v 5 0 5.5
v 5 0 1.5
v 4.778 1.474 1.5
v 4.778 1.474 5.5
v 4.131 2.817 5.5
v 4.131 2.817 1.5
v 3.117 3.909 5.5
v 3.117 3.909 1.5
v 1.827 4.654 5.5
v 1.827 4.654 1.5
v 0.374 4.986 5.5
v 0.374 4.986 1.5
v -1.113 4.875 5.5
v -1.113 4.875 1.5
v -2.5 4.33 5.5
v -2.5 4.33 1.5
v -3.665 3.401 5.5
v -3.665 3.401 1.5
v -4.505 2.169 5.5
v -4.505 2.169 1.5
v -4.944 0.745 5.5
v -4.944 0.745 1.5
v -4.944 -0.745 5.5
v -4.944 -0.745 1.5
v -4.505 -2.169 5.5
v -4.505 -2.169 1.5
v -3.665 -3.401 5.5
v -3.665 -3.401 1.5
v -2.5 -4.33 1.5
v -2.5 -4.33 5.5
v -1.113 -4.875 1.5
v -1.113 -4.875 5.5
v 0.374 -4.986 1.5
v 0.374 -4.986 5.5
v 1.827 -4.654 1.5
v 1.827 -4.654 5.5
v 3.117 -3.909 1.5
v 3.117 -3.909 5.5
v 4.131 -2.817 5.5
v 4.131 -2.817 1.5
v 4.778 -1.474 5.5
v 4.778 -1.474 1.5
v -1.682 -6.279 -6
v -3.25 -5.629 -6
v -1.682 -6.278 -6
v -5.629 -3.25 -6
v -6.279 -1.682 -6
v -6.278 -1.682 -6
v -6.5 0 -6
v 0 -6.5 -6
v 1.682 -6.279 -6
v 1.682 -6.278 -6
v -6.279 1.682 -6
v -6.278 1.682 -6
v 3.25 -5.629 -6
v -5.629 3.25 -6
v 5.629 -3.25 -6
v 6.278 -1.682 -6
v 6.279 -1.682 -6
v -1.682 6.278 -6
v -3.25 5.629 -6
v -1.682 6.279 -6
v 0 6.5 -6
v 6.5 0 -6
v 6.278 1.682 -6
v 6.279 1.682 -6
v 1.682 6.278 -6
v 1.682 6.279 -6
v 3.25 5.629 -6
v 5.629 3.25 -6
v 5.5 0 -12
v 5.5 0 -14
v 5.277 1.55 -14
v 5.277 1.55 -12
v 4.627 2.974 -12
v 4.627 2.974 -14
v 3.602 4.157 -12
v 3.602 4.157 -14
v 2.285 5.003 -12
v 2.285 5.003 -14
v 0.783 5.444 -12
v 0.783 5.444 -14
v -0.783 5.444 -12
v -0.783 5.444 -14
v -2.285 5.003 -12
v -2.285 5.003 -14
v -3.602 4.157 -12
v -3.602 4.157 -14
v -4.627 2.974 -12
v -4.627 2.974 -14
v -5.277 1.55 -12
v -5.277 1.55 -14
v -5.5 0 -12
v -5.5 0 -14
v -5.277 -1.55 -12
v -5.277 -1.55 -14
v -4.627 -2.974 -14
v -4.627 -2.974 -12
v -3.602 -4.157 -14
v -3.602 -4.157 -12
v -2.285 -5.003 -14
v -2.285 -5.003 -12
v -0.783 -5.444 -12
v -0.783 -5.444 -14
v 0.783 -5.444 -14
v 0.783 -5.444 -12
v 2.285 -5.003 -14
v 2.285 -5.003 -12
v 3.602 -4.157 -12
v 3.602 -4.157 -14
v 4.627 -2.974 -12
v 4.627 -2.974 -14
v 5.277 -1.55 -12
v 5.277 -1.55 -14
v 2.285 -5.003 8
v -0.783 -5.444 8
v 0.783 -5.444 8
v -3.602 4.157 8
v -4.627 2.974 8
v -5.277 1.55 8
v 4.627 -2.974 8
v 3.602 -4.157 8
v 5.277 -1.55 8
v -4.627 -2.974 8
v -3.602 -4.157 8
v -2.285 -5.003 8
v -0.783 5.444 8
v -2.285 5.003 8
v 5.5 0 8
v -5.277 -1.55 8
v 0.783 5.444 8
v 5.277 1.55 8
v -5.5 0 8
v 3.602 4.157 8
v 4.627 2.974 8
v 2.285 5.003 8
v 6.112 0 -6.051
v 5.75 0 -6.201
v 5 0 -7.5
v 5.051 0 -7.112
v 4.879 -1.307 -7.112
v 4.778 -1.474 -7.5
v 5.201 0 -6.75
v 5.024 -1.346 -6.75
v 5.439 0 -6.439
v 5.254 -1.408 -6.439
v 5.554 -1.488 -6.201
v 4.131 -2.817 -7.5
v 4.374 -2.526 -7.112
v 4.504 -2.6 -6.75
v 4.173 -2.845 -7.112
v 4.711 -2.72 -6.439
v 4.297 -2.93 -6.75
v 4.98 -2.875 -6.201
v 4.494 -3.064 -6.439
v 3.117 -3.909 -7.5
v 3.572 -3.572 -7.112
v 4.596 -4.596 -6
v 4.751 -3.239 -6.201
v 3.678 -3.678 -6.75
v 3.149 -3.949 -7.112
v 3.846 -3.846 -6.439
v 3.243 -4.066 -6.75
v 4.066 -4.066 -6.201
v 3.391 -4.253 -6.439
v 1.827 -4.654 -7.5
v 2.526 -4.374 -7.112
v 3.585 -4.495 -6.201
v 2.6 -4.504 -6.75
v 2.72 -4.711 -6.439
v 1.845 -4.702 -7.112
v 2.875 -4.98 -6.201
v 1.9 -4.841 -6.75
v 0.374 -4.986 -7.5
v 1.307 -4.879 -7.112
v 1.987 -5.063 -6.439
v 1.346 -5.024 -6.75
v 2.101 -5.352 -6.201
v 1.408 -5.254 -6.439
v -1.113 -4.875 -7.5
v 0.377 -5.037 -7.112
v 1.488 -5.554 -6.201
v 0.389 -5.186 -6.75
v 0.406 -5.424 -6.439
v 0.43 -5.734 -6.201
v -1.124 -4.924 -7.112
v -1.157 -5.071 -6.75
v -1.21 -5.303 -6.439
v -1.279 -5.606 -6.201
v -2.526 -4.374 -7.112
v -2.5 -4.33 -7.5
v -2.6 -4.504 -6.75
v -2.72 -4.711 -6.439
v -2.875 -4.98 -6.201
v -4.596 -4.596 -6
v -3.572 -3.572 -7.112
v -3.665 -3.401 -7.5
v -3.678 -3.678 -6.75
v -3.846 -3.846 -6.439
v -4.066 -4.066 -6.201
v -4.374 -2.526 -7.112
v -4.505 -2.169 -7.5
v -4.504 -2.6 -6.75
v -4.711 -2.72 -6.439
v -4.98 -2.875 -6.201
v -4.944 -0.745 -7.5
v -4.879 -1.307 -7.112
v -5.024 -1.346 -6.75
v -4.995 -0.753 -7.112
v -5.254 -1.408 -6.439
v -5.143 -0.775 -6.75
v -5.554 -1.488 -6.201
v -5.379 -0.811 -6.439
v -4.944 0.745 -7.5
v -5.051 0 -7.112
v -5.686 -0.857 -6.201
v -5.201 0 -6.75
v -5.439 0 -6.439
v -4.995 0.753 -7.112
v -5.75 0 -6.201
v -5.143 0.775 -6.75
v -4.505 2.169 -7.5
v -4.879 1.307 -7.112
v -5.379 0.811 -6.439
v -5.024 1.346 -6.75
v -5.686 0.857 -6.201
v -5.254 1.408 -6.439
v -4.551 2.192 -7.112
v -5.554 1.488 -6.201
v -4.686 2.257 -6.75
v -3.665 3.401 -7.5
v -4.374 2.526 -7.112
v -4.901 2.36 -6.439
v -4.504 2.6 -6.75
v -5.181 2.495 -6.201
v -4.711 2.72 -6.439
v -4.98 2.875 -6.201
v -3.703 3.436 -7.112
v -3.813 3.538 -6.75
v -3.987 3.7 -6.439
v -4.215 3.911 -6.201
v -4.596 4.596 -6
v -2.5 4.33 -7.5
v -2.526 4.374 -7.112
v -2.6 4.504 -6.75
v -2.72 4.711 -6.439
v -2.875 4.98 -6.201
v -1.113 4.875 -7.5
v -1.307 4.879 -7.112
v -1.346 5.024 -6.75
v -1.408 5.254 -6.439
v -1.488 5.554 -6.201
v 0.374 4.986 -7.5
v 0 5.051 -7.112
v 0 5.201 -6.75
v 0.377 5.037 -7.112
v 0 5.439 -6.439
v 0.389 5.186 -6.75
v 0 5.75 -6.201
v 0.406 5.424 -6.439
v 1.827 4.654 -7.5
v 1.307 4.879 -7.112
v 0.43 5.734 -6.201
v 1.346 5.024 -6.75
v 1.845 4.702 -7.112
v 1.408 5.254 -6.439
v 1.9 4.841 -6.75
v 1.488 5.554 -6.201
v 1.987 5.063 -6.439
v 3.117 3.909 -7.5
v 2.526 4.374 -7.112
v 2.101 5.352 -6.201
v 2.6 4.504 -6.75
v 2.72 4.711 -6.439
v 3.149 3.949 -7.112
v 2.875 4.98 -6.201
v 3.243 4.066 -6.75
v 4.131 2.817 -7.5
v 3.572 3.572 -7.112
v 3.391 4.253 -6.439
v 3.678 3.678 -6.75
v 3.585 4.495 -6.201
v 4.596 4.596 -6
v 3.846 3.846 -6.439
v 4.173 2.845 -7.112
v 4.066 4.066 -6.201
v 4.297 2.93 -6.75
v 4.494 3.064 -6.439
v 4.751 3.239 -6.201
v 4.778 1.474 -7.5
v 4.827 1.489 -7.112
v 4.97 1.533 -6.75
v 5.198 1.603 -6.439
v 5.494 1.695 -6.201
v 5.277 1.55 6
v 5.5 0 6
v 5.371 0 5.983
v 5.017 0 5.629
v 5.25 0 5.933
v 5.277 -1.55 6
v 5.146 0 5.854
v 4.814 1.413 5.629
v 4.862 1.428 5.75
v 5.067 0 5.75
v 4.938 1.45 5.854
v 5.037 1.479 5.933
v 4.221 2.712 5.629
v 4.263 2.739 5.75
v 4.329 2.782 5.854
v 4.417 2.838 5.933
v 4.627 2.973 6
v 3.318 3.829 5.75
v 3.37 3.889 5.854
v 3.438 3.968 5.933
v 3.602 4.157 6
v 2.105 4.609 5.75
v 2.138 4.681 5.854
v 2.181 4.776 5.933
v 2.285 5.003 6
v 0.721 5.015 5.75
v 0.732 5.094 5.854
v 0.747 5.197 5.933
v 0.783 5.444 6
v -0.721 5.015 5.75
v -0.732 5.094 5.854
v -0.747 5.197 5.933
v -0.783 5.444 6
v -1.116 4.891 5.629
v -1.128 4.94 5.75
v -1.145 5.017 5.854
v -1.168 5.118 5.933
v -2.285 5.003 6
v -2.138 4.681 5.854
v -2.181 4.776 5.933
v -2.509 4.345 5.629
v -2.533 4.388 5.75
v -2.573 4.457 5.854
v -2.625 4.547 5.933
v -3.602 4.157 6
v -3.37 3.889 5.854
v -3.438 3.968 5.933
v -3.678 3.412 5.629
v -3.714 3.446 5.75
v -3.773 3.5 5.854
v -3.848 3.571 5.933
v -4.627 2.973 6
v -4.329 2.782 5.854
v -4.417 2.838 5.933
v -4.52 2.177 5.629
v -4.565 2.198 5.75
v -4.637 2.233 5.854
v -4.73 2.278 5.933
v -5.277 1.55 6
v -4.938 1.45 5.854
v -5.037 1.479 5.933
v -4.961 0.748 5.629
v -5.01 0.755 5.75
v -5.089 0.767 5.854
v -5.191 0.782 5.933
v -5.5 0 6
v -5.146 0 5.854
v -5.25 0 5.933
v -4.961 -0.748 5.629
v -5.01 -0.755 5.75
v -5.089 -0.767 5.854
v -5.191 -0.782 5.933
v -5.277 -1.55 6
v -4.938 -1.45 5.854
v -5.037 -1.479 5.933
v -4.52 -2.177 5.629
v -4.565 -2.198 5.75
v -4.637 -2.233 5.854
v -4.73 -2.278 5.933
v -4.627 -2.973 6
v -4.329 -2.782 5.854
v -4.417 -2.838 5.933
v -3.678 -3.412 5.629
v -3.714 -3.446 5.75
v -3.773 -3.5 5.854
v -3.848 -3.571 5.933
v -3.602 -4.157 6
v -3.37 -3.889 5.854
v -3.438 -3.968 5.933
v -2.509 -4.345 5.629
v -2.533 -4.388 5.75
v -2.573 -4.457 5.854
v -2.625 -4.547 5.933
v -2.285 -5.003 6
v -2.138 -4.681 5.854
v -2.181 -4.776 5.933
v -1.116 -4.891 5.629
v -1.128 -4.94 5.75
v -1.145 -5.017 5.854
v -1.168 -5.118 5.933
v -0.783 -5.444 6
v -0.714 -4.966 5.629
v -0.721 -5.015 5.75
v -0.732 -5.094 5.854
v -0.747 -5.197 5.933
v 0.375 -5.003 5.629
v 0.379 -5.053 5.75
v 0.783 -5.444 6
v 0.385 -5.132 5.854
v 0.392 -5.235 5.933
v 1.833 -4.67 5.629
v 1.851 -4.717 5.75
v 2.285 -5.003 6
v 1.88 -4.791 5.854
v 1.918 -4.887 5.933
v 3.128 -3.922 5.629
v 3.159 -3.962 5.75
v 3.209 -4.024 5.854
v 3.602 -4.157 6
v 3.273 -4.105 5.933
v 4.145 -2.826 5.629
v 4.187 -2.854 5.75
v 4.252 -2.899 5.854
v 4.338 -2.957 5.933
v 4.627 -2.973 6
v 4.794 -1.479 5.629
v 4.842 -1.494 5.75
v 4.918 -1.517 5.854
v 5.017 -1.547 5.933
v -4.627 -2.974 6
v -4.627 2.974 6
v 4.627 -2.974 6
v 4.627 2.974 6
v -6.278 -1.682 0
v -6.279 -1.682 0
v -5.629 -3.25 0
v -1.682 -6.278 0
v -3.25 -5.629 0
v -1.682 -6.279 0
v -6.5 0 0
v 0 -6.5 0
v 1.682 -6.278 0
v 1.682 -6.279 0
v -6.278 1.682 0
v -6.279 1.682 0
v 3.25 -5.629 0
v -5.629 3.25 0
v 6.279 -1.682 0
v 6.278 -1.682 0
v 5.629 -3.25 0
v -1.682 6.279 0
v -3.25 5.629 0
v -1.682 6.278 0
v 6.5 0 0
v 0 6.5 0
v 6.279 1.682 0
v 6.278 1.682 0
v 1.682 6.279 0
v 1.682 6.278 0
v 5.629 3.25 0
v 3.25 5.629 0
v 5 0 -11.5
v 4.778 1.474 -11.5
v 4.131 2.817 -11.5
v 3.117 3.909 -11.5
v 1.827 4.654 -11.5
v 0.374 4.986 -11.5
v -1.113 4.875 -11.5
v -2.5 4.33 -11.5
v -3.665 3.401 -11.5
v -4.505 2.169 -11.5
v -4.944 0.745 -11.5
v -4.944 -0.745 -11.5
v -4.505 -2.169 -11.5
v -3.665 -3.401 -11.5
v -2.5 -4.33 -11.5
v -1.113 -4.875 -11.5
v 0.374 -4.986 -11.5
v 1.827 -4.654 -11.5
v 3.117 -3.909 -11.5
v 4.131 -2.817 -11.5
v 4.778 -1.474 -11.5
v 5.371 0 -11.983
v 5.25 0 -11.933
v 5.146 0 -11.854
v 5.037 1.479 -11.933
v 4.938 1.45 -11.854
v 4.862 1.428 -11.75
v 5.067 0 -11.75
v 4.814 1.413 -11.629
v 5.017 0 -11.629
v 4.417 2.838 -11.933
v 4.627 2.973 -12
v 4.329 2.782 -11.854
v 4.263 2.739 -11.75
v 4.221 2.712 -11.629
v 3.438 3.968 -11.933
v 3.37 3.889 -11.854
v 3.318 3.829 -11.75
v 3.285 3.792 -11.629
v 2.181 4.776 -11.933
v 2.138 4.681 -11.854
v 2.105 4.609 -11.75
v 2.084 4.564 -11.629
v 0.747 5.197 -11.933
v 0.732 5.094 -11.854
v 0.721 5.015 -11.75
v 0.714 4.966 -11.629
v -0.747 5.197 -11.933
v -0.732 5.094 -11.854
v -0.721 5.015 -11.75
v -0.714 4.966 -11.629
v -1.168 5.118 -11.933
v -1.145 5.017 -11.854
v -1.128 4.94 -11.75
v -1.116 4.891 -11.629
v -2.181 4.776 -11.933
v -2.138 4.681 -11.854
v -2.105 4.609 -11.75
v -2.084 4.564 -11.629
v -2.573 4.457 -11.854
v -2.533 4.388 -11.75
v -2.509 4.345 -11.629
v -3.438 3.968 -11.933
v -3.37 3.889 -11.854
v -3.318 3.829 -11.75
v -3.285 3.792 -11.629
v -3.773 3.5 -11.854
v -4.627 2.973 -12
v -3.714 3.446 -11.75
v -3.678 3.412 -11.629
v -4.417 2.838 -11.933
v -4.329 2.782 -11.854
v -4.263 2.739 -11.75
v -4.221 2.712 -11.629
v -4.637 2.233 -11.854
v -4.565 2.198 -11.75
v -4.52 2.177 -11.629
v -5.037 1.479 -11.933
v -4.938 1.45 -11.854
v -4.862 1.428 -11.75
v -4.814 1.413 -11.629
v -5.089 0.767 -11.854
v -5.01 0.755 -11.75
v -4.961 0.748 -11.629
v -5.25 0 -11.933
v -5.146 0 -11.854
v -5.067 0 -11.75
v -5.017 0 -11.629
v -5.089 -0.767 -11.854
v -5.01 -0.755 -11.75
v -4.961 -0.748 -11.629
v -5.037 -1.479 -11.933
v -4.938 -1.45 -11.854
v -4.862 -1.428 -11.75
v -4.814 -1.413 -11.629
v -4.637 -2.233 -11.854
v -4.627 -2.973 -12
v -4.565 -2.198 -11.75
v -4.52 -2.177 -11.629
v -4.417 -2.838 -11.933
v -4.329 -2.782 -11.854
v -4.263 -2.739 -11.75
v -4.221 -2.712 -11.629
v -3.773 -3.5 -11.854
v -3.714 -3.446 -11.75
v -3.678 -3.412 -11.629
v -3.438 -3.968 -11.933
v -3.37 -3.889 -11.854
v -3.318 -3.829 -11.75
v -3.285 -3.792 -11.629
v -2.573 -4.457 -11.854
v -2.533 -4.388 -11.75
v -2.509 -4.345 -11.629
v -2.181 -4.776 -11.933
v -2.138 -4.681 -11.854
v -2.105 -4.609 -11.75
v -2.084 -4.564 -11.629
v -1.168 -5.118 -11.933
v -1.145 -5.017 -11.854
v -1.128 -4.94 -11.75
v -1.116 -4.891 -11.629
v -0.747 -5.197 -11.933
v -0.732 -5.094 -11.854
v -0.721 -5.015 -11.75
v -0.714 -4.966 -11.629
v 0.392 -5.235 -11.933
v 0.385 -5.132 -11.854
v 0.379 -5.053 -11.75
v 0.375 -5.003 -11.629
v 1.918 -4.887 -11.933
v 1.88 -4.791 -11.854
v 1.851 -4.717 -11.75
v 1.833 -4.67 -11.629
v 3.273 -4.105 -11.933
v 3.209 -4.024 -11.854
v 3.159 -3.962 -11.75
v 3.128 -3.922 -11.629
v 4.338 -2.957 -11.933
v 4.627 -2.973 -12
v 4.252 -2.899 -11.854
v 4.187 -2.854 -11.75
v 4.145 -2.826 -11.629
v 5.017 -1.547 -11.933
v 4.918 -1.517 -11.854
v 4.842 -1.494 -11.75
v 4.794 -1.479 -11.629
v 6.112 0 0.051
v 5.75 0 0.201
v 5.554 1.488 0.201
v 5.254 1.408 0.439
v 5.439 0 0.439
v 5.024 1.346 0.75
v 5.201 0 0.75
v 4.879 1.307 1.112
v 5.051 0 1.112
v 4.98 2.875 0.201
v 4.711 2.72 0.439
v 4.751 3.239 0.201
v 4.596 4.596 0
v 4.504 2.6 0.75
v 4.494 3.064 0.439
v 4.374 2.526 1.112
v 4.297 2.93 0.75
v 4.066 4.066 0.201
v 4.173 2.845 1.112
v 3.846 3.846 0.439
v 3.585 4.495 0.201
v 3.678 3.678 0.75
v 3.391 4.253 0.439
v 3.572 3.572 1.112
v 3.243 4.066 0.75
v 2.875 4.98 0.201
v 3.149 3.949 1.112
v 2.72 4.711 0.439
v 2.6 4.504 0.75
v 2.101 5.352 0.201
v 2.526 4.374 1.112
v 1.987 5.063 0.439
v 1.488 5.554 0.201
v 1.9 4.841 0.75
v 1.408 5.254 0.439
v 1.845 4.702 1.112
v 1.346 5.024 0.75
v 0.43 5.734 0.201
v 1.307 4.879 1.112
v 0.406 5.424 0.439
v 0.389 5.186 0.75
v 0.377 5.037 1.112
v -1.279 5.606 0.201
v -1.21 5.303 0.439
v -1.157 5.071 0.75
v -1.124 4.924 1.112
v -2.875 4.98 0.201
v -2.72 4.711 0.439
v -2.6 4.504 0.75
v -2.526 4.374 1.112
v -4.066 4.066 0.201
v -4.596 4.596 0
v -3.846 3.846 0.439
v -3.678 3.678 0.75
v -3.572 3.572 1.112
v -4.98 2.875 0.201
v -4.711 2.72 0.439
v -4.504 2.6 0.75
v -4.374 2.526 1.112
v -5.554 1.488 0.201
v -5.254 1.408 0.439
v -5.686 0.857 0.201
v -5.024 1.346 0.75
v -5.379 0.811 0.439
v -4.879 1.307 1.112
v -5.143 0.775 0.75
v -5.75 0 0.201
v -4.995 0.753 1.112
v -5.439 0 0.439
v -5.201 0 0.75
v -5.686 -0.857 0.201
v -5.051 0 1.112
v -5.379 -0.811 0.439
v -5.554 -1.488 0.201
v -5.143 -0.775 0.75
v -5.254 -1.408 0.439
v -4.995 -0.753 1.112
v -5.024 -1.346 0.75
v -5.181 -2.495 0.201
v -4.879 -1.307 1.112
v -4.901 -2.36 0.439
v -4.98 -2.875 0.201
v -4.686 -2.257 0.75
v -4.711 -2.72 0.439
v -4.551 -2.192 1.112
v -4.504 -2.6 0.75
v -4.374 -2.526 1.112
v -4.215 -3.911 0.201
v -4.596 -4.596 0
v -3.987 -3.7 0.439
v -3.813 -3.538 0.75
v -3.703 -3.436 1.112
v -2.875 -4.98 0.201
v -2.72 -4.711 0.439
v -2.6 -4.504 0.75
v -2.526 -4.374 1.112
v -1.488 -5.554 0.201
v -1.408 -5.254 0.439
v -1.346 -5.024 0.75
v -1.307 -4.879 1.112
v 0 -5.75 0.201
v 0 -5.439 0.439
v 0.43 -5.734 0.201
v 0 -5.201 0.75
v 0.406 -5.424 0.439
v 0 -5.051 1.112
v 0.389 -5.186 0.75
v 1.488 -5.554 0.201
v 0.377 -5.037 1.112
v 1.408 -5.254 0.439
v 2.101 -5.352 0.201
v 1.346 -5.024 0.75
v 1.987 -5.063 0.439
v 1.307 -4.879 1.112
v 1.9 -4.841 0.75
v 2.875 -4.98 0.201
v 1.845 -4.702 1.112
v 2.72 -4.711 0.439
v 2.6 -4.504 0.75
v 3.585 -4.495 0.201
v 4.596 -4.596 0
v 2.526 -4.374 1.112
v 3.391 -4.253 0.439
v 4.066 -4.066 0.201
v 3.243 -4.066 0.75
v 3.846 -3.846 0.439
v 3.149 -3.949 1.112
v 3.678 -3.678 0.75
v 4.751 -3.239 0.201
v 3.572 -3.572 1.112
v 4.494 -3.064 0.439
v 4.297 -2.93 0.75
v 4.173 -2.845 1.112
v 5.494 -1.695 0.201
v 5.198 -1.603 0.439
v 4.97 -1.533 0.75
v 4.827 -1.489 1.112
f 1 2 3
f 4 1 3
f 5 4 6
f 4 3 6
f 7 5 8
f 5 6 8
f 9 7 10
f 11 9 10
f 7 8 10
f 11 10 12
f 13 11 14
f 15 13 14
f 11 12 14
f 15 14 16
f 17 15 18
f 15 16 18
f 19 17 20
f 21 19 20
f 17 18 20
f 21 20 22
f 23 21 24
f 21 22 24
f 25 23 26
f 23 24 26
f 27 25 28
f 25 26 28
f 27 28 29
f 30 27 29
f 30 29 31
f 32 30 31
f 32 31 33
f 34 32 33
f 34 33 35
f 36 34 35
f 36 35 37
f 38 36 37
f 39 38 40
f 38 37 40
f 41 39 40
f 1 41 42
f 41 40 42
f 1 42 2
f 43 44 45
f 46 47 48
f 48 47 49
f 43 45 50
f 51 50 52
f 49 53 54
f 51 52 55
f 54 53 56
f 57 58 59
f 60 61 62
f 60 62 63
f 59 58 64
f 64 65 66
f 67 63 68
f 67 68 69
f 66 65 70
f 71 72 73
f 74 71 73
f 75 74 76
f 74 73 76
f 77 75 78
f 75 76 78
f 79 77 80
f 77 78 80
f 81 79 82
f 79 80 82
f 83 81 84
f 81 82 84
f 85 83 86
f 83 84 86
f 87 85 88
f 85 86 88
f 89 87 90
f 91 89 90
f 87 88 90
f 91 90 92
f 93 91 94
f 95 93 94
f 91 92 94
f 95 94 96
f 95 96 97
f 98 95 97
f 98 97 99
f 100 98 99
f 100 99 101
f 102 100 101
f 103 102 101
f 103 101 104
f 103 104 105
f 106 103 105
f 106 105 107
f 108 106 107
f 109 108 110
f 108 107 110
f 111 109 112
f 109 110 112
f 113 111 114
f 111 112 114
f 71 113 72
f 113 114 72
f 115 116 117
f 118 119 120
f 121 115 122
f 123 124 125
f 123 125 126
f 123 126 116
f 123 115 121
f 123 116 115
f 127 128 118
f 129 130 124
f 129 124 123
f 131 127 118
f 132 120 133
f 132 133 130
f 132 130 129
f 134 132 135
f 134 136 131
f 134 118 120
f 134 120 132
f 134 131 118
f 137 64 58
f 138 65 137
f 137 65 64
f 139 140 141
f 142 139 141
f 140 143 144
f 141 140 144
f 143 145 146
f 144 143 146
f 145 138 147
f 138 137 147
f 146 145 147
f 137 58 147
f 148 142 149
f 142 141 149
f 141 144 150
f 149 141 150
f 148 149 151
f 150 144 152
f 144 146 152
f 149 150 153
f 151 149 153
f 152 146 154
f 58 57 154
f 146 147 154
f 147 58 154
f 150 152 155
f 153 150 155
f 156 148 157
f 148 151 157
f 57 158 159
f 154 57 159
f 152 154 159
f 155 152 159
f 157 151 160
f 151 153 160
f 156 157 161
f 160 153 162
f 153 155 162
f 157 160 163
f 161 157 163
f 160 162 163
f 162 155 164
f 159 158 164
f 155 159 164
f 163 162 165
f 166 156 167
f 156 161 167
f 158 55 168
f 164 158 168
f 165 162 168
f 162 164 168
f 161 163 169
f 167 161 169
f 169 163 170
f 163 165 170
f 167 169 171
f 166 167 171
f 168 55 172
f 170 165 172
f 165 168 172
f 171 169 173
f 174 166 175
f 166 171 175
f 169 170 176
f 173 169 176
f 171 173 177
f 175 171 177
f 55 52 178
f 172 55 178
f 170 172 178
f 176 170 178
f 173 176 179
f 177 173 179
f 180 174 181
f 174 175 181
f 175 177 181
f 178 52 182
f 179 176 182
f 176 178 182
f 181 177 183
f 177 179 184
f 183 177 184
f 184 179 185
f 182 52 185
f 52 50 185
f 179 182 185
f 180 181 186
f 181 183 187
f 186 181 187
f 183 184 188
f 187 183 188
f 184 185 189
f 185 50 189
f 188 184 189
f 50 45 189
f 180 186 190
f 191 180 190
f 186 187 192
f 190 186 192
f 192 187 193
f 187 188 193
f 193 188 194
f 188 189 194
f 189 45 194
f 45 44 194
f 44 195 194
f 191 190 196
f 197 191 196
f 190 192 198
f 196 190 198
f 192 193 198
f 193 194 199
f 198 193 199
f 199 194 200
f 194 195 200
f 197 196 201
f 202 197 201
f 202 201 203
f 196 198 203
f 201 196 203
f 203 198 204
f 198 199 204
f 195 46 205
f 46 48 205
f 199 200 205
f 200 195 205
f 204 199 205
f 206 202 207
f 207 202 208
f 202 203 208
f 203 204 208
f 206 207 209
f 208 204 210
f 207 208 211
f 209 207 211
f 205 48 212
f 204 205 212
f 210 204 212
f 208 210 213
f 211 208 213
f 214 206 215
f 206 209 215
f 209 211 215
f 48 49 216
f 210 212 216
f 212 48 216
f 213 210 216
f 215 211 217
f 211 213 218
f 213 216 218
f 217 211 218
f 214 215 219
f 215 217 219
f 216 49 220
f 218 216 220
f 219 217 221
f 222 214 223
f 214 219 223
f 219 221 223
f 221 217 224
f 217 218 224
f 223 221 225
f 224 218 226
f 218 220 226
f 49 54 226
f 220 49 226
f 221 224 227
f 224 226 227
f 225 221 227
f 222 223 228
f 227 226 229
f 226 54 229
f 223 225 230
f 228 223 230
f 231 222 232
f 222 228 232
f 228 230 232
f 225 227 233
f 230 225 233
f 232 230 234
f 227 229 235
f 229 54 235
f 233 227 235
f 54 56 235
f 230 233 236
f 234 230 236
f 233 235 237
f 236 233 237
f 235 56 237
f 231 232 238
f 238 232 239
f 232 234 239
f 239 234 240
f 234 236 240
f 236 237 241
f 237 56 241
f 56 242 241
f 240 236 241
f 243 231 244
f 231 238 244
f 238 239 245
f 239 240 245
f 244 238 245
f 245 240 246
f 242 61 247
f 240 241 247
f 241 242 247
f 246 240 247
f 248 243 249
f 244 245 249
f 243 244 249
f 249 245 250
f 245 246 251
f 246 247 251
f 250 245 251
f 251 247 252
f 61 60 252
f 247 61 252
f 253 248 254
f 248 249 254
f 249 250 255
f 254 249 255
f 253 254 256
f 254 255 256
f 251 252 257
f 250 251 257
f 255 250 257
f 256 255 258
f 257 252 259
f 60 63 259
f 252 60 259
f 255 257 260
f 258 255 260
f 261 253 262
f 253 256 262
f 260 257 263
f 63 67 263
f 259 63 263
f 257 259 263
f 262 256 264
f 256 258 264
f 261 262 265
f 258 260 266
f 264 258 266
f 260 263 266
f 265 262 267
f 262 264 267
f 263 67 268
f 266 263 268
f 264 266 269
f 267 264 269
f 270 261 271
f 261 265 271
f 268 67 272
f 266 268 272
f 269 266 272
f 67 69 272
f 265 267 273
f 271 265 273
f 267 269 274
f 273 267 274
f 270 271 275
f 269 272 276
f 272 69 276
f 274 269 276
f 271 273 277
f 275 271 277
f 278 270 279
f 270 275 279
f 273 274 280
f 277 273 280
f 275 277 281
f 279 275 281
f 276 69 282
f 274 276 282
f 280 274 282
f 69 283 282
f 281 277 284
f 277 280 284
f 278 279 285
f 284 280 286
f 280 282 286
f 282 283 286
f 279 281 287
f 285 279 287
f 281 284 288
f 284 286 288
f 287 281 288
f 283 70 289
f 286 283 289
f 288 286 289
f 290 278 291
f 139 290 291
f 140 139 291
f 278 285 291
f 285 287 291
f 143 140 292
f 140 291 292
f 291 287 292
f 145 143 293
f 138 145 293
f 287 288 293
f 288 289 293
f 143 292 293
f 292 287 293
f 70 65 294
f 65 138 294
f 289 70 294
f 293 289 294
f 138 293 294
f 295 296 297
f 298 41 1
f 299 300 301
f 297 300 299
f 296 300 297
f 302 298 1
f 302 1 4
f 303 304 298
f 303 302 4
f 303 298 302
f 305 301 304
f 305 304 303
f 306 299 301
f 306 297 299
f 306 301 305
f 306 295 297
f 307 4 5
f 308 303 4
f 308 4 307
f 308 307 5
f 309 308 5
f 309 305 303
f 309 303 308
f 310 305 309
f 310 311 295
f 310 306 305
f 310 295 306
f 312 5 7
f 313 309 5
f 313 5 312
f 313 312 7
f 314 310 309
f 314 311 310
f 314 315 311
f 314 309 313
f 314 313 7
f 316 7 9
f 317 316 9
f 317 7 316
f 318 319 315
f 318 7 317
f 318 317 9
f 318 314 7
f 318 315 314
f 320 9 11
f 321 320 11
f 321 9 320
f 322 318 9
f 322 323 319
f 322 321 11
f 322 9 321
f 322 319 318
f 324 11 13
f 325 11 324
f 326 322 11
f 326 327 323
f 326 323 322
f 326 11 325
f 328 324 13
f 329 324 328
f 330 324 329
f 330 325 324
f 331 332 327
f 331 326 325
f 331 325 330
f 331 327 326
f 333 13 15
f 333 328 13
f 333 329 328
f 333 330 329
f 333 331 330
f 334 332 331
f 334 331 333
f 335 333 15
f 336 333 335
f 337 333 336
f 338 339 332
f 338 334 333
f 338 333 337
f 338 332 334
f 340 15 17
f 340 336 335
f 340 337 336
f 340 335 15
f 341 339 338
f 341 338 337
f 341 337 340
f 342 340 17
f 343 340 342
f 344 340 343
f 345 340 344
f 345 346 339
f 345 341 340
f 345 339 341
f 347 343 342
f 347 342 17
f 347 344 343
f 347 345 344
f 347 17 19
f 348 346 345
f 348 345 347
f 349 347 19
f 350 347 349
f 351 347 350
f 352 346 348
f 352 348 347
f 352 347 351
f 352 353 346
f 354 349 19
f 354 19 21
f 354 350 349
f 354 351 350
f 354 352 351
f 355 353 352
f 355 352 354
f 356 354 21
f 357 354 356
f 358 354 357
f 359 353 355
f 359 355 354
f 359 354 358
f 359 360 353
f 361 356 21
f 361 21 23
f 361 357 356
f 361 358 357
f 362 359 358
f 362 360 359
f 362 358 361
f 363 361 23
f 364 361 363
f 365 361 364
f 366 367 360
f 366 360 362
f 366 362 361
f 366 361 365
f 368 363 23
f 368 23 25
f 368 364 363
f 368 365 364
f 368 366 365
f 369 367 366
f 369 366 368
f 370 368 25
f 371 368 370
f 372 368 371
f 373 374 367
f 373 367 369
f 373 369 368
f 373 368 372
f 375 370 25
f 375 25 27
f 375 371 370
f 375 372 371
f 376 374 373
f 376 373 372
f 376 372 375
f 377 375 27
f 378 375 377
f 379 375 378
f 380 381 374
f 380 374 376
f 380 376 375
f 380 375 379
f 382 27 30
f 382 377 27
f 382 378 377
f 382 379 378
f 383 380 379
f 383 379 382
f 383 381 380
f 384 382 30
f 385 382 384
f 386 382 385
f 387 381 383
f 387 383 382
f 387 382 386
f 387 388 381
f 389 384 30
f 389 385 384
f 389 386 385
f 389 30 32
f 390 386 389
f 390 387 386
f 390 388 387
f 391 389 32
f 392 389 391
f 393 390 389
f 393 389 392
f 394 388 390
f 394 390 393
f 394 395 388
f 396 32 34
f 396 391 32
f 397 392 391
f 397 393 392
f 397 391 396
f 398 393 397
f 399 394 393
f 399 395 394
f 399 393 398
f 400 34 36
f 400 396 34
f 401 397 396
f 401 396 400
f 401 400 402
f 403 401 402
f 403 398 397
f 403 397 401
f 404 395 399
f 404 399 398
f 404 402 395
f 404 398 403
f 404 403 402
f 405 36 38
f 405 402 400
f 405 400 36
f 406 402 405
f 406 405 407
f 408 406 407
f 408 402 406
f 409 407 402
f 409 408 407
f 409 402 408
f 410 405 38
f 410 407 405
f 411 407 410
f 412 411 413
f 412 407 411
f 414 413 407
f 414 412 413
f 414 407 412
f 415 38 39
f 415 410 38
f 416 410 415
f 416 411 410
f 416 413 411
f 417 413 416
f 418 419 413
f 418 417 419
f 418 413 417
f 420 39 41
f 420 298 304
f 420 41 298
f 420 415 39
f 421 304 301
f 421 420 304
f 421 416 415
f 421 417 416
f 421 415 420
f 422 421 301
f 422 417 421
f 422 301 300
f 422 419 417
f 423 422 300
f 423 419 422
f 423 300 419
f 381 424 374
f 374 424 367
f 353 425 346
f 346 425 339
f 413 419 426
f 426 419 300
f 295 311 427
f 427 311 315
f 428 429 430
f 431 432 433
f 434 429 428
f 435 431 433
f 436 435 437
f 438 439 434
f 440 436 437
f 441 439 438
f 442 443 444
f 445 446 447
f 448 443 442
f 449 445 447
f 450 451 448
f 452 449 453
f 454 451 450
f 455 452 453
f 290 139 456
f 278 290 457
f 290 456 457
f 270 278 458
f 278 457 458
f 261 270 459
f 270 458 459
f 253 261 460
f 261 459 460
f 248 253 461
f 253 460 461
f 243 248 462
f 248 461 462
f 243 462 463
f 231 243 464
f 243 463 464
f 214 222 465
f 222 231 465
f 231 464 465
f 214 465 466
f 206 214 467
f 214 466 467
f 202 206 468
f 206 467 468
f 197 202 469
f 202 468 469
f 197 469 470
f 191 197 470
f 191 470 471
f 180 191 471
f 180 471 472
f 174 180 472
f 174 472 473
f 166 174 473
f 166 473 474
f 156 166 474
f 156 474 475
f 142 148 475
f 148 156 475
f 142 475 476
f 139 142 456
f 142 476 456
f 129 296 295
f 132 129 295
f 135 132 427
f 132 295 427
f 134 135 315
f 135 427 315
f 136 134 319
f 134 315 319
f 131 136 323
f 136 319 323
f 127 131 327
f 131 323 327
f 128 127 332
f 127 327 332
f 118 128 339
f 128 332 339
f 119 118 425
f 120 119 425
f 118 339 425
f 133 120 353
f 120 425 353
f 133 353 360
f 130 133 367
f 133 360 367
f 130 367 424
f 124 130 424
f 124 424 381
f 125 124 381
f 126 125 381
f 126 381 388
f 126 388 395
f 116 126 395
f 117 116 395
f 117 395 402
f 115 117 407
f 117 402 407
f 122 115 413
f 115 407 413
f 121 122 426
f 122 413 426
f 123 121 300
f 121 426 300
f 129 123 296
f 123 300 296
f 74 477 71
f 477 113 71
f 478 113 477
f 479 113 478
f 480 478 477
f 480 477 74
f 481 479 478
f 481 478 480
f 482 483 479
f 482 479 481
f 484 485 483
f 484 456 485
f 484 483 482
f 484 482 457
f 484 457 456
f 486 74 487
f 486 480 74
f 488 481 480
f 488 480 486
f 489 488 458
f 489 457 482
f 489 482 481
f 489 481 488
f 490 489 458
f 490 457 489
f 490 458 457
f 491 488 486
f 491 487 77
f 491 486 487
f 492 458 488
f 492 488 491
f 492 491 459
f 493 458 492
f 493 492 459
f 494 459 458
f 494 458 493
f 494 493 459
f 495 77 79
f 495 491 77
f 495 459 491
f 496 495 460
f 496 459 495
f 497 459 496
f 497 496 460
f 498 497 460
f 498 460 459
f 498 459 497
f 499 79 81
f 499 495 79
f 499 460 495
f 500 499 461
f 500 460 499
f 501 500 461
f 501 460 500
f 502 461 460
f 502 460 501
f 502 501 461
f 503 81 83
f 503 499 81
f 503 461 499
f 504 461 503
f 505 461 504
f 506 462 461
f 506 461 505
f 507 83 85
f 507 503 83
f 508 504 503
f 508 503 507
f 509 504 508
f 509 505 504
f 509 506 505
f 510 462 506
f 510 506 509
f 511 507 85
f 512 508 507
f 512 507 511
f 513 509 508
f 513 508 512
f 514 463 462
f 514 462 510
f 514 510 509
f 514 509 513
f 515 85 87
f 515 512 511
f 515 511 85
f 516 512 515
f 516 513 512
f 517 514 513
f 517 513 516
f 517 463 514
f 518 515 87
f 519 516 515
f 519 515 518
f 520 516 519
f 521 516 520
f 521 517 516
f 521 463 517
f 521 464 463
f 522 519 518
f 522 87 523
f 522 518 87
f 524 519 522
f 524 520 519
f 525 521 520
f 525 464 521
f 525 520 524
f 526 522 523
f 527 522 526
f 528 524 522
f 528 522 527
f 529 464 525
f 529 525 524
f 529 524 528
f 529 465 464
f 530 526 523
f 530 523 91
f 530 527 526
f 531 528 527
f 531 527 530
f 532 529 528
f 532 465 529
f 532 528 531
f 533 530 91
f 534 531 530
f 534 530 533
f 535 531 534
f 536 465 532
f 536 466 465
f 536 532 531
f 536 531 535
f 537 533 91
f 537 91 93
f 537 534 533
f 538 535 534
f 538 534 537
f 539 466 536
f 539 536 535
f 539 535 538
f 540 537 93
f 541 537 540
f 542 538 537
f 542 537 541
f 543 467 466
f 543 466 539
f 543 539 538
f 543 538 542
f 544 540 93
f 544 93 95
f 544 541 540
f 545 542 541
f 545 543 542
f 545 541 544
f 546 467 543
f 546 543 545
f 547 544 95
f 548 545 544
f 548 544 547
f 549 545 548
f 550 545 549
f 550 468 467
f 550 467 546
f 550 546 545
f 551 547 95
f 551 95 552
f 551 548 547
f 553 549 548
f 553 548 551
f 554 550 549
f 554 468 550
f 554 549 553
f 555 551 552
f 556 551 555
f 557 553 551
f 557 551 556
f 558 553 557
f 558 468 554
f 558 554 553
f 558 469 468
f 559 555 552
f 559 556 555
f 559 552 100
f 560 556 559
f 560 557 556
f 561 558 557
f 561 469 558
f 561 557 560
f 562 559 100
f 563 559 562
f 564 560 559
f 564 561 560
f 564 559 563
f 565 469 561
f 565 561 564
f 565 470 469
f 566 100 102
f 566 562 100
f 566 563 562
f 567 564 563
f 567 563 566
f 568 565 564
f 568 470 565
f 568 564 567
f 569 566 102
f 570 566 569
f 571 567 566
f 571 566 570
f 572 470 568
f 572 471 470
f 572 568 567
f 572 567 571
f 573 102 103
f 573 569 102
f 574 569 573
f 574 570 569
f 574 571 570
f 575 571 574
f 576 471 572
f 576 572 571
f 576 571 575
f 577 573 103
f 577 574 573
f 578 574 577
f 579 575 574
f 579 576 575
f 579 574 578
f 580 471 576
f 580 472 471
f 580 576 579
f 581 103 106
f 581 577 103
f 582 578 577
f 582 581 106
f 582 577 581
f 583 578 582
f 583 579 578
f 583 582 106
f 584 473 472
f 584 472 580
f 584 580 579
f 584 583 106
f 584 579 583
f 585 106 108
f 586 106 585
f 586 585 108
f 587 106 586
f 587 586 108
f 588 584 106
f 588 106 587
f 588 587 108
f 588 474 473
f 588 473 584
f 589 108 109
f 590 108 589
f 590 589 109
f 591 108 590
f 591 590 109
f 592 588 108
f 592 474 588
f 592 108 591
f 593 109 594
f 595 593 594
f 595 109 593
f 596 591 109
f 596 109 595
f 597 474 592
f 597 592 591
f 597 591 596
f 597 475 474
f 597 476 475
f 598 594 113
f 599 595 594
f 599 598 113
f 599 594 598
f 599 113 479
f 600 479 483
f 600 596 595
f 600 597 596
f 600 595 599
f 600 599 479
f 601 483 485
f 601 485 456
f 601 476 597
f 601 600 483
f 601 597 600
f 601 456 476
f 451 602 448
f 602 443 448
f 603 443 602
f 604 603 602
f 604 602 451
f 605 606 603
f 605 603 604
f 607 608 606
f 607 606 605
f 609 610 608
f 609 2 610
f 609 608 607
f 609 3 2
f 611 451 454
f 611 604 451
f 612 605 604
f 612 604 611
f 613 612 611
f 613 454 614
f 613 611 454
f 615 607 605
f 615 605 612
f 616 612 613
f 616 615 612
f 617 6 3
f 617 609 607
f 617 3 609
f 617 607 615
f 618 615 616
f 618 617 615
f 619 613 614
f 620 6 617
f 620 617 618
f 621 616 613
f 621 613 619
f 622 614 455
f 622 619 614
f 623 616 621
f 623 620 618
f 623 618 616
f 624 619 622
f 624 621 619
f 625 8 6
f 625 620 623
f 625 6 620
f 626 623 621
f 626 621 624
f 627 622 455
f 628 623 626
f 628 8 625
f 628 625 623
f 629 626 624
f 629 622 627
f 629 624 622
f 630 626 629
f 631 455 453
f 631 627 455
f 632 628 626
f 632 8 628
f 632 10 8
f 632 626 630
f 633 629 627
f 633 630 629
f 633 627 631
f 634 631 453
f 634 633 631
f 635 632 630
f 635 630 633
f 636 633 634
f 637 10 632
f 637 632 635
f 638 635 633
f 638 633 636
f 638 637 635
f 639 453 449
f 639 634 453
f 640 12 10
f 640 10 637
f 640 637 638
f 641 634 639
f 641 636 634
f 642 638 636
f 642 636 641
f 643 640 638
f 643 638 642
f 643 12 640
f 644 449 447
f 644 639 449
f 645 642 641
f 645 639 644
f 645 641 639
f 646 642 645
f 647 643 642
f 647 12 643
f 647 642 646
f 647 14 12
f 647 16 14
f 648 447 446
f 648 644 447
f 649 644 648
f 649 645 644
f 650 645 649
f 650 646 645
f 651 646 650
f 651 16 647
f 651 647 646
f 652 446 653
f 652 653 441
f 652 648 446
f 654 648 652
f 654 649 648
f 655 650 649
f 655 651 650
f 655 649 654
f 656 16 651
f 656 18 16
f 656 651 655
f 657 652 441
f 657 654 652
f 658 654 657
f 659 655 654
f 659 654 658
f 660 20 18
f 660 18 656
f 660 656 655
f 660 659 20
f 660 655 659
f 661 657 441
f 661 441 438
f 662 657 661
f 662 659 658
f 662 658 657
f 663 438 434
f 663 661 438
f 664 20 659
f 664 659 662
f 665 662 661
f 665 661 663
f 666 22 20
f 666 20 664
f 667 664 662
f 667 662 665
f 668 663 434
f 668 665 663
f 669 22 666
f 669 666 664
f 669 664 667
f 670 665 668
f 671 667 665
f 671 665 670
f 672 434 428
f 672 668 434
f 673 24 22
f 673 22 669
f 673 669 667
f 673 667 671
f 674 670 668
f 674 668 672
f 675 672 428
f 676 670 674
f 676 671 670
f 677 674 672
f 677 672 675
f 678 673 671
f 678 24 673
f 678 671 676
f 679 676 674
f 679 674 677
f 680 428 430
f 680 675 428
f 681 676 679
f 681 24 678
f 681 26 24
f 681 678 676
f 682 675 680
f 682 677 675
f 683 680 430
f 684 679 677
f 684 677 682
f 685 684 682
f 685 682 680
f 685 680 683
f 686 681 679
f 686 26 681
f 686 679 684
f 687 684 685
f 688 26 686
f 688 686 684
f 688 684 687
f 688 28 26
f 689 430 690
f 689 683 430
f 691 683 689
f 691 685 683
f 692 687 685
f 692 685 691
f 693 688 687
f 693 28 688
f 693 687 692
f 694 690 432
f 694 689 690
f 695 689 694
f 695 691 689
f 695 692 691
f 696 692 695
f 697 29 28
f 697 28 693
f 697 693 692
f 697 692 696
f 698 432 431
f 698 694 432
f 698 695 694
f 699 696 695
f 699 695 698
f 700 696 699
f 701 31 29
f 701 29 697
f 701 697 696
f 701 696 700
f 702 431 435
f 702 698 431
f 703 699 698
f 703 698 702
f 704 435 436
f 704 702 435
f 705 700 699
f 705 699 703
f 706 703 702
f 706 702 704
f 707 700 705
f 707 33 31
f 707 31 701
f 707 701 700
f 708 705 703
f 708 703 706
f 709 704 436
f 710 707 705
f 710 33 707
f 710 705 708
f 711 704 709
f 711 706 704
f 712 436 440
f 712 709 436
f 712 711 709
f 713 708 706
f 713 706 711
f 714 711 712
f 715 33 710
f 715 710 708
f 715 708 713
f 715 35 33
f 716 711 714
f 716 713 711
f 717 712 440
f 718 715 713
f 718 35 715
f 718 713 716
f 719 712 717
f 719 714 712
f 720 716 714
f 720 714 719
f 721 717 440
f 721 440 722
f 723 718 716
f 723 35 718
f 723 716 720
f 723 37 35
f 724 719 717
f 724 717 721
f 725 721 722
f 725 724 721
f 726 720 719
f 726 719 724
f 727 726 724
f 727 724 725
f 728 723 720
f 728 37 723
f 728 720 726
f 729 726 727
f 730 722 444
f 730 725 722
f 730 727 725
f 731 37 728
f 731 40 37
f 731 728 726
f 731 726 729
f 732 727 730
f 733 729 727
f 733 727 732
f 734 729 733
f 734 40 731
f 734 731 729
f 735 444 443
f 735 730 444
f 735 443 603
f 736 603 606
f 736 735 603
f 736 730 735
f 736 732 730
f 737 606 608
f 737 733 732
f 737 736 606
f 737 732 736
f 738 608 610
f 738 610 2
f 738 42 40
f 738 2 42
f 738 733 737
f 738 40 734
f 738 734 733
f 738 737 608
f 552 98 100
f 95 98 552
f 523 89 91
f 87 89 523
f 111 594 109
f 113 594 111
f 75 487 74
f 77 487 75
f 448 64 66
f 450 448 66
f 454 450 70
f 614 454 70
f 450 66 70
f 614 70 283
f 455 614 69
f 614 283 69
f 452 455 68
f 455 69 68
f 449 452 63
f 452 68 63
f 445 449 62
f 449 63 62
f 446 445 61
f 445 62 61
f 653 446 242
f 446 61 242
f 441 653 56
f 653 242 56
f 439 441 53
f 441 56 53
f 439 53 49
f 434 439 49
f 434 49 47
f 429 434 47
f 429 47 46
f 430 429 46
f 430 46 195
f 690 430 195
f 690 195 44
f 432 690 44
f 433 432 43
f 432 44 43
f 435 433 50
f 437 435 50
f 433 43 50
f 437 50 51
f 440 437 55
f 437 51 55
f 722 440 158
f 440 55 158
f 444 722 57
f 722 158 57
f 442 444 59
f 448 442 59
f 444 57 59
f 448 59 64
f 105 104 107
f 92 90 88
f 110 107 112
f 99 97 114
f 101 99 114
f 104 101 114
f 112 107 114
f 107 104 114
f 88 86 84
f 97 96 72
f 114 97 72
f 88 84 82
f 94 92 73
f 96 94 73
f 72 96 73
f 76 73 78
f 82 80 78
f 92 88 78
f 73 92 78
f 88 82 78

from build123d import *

# Parameters (mm, degrees)
SKETCH1_R           = 5
BOSS_EXTRUDE1_DEPTH = 6
BOSS_EXTRUDE2_START = -6
SKETCH1_3_R         = 6.5
SKETCH1_3_R_2       = 5
BOSS_EXTRUDE2_DEPTH = 6
BOSS_EXTRUDE3_START = -12
SKETCH1_4_R         = 5
BOSS_EXTRUDE3_DEPTH = 12
FILLET1_R           = 1.5
SKETCH3_R           = 5.5
BOSS_EXTRUDE4_DEPTH = 2
BOSS_EXTRUDE5_START = -20
SKETCH3_2_R         = 5.5
BOSS_EXTRUDE5_DEPTH = 2
FILLET2_R           = 0.5


with BuildPart() as part:
    # Sketch1 → Boss-Extrude1 (new body)
    with BuildSketch(Plane.XY):
        Circle(SKETCH1_R)
    extrude(amount=BOSS_EXTRUDE1_DEPTH)

    # Sketch1<3> → Boss-Extrude2 (add)
    # profile 1 of 2: a face of its own
    with BuildSketch(Plane.XY.offset(BOSS_EXTRUDE2_START)):
        Circle(SKETCH1_3_R)
        Circle(SKETCH1_3_R_2, mode=Mode.SUBTRACT)
    # profile 2 of 2: a face of its own
    with BuildSketch(Plane.XY.offset(BOSS_EXTRUDE2_START)):
        Circle(SKETCH1_3_R_2)
    extrude(amount=BOSS_EXTRUDE2_DEPTH)

    # Sketch1<4> → Boss-Extrude3 (add)
    with BuildSketch(Plane.XY.offset(BOSS_EXTRUDE3_START)):
        Circle(SKETCH1_4_R)
    extrude(amount=BOSS_EXTRUDE3_DEPTH)

    # Fillet1
    fillet1_edges = [part.edges().sort_by_distance(p)[0] for p in [
        (-5, 0, -6),
        (-5, 0, 0),
    ]]
    fillet(fillet1_edges, radius=FILLET1_R - 0.0001)  # a hair under: the kernel refuses the full size

    # Sketch3 → Boss-Extrude4 (add)
    with BuildSketch(Plane.XY.offset(6)):
        Circle(SKETCH3_R)
    extrude(amount=BOSS_EXTRUDE4_DEPTH)

    # Sketch3<2> → Boss-Extrude5 (add)
    with BuildSketch(Plane.XY.offset(6).offset(BOSS_EXTRUDE5_START)):
        Circle(SKETCH3_2_R)
    extrude(amount=BOSS_EXTRUDE5_DEPTH)

    # Fillet2
    fillet2_edges = [part.edges().sort_by_distance(p)[0] for p in [
        (-5, 0, -12),
        (-5, 0, 6),
    ]]
    fillet(fillet2_edges, radius=FILLET2_R - 0.0001)  # a hair under: the kernel refuses the full size


solid = part.part
